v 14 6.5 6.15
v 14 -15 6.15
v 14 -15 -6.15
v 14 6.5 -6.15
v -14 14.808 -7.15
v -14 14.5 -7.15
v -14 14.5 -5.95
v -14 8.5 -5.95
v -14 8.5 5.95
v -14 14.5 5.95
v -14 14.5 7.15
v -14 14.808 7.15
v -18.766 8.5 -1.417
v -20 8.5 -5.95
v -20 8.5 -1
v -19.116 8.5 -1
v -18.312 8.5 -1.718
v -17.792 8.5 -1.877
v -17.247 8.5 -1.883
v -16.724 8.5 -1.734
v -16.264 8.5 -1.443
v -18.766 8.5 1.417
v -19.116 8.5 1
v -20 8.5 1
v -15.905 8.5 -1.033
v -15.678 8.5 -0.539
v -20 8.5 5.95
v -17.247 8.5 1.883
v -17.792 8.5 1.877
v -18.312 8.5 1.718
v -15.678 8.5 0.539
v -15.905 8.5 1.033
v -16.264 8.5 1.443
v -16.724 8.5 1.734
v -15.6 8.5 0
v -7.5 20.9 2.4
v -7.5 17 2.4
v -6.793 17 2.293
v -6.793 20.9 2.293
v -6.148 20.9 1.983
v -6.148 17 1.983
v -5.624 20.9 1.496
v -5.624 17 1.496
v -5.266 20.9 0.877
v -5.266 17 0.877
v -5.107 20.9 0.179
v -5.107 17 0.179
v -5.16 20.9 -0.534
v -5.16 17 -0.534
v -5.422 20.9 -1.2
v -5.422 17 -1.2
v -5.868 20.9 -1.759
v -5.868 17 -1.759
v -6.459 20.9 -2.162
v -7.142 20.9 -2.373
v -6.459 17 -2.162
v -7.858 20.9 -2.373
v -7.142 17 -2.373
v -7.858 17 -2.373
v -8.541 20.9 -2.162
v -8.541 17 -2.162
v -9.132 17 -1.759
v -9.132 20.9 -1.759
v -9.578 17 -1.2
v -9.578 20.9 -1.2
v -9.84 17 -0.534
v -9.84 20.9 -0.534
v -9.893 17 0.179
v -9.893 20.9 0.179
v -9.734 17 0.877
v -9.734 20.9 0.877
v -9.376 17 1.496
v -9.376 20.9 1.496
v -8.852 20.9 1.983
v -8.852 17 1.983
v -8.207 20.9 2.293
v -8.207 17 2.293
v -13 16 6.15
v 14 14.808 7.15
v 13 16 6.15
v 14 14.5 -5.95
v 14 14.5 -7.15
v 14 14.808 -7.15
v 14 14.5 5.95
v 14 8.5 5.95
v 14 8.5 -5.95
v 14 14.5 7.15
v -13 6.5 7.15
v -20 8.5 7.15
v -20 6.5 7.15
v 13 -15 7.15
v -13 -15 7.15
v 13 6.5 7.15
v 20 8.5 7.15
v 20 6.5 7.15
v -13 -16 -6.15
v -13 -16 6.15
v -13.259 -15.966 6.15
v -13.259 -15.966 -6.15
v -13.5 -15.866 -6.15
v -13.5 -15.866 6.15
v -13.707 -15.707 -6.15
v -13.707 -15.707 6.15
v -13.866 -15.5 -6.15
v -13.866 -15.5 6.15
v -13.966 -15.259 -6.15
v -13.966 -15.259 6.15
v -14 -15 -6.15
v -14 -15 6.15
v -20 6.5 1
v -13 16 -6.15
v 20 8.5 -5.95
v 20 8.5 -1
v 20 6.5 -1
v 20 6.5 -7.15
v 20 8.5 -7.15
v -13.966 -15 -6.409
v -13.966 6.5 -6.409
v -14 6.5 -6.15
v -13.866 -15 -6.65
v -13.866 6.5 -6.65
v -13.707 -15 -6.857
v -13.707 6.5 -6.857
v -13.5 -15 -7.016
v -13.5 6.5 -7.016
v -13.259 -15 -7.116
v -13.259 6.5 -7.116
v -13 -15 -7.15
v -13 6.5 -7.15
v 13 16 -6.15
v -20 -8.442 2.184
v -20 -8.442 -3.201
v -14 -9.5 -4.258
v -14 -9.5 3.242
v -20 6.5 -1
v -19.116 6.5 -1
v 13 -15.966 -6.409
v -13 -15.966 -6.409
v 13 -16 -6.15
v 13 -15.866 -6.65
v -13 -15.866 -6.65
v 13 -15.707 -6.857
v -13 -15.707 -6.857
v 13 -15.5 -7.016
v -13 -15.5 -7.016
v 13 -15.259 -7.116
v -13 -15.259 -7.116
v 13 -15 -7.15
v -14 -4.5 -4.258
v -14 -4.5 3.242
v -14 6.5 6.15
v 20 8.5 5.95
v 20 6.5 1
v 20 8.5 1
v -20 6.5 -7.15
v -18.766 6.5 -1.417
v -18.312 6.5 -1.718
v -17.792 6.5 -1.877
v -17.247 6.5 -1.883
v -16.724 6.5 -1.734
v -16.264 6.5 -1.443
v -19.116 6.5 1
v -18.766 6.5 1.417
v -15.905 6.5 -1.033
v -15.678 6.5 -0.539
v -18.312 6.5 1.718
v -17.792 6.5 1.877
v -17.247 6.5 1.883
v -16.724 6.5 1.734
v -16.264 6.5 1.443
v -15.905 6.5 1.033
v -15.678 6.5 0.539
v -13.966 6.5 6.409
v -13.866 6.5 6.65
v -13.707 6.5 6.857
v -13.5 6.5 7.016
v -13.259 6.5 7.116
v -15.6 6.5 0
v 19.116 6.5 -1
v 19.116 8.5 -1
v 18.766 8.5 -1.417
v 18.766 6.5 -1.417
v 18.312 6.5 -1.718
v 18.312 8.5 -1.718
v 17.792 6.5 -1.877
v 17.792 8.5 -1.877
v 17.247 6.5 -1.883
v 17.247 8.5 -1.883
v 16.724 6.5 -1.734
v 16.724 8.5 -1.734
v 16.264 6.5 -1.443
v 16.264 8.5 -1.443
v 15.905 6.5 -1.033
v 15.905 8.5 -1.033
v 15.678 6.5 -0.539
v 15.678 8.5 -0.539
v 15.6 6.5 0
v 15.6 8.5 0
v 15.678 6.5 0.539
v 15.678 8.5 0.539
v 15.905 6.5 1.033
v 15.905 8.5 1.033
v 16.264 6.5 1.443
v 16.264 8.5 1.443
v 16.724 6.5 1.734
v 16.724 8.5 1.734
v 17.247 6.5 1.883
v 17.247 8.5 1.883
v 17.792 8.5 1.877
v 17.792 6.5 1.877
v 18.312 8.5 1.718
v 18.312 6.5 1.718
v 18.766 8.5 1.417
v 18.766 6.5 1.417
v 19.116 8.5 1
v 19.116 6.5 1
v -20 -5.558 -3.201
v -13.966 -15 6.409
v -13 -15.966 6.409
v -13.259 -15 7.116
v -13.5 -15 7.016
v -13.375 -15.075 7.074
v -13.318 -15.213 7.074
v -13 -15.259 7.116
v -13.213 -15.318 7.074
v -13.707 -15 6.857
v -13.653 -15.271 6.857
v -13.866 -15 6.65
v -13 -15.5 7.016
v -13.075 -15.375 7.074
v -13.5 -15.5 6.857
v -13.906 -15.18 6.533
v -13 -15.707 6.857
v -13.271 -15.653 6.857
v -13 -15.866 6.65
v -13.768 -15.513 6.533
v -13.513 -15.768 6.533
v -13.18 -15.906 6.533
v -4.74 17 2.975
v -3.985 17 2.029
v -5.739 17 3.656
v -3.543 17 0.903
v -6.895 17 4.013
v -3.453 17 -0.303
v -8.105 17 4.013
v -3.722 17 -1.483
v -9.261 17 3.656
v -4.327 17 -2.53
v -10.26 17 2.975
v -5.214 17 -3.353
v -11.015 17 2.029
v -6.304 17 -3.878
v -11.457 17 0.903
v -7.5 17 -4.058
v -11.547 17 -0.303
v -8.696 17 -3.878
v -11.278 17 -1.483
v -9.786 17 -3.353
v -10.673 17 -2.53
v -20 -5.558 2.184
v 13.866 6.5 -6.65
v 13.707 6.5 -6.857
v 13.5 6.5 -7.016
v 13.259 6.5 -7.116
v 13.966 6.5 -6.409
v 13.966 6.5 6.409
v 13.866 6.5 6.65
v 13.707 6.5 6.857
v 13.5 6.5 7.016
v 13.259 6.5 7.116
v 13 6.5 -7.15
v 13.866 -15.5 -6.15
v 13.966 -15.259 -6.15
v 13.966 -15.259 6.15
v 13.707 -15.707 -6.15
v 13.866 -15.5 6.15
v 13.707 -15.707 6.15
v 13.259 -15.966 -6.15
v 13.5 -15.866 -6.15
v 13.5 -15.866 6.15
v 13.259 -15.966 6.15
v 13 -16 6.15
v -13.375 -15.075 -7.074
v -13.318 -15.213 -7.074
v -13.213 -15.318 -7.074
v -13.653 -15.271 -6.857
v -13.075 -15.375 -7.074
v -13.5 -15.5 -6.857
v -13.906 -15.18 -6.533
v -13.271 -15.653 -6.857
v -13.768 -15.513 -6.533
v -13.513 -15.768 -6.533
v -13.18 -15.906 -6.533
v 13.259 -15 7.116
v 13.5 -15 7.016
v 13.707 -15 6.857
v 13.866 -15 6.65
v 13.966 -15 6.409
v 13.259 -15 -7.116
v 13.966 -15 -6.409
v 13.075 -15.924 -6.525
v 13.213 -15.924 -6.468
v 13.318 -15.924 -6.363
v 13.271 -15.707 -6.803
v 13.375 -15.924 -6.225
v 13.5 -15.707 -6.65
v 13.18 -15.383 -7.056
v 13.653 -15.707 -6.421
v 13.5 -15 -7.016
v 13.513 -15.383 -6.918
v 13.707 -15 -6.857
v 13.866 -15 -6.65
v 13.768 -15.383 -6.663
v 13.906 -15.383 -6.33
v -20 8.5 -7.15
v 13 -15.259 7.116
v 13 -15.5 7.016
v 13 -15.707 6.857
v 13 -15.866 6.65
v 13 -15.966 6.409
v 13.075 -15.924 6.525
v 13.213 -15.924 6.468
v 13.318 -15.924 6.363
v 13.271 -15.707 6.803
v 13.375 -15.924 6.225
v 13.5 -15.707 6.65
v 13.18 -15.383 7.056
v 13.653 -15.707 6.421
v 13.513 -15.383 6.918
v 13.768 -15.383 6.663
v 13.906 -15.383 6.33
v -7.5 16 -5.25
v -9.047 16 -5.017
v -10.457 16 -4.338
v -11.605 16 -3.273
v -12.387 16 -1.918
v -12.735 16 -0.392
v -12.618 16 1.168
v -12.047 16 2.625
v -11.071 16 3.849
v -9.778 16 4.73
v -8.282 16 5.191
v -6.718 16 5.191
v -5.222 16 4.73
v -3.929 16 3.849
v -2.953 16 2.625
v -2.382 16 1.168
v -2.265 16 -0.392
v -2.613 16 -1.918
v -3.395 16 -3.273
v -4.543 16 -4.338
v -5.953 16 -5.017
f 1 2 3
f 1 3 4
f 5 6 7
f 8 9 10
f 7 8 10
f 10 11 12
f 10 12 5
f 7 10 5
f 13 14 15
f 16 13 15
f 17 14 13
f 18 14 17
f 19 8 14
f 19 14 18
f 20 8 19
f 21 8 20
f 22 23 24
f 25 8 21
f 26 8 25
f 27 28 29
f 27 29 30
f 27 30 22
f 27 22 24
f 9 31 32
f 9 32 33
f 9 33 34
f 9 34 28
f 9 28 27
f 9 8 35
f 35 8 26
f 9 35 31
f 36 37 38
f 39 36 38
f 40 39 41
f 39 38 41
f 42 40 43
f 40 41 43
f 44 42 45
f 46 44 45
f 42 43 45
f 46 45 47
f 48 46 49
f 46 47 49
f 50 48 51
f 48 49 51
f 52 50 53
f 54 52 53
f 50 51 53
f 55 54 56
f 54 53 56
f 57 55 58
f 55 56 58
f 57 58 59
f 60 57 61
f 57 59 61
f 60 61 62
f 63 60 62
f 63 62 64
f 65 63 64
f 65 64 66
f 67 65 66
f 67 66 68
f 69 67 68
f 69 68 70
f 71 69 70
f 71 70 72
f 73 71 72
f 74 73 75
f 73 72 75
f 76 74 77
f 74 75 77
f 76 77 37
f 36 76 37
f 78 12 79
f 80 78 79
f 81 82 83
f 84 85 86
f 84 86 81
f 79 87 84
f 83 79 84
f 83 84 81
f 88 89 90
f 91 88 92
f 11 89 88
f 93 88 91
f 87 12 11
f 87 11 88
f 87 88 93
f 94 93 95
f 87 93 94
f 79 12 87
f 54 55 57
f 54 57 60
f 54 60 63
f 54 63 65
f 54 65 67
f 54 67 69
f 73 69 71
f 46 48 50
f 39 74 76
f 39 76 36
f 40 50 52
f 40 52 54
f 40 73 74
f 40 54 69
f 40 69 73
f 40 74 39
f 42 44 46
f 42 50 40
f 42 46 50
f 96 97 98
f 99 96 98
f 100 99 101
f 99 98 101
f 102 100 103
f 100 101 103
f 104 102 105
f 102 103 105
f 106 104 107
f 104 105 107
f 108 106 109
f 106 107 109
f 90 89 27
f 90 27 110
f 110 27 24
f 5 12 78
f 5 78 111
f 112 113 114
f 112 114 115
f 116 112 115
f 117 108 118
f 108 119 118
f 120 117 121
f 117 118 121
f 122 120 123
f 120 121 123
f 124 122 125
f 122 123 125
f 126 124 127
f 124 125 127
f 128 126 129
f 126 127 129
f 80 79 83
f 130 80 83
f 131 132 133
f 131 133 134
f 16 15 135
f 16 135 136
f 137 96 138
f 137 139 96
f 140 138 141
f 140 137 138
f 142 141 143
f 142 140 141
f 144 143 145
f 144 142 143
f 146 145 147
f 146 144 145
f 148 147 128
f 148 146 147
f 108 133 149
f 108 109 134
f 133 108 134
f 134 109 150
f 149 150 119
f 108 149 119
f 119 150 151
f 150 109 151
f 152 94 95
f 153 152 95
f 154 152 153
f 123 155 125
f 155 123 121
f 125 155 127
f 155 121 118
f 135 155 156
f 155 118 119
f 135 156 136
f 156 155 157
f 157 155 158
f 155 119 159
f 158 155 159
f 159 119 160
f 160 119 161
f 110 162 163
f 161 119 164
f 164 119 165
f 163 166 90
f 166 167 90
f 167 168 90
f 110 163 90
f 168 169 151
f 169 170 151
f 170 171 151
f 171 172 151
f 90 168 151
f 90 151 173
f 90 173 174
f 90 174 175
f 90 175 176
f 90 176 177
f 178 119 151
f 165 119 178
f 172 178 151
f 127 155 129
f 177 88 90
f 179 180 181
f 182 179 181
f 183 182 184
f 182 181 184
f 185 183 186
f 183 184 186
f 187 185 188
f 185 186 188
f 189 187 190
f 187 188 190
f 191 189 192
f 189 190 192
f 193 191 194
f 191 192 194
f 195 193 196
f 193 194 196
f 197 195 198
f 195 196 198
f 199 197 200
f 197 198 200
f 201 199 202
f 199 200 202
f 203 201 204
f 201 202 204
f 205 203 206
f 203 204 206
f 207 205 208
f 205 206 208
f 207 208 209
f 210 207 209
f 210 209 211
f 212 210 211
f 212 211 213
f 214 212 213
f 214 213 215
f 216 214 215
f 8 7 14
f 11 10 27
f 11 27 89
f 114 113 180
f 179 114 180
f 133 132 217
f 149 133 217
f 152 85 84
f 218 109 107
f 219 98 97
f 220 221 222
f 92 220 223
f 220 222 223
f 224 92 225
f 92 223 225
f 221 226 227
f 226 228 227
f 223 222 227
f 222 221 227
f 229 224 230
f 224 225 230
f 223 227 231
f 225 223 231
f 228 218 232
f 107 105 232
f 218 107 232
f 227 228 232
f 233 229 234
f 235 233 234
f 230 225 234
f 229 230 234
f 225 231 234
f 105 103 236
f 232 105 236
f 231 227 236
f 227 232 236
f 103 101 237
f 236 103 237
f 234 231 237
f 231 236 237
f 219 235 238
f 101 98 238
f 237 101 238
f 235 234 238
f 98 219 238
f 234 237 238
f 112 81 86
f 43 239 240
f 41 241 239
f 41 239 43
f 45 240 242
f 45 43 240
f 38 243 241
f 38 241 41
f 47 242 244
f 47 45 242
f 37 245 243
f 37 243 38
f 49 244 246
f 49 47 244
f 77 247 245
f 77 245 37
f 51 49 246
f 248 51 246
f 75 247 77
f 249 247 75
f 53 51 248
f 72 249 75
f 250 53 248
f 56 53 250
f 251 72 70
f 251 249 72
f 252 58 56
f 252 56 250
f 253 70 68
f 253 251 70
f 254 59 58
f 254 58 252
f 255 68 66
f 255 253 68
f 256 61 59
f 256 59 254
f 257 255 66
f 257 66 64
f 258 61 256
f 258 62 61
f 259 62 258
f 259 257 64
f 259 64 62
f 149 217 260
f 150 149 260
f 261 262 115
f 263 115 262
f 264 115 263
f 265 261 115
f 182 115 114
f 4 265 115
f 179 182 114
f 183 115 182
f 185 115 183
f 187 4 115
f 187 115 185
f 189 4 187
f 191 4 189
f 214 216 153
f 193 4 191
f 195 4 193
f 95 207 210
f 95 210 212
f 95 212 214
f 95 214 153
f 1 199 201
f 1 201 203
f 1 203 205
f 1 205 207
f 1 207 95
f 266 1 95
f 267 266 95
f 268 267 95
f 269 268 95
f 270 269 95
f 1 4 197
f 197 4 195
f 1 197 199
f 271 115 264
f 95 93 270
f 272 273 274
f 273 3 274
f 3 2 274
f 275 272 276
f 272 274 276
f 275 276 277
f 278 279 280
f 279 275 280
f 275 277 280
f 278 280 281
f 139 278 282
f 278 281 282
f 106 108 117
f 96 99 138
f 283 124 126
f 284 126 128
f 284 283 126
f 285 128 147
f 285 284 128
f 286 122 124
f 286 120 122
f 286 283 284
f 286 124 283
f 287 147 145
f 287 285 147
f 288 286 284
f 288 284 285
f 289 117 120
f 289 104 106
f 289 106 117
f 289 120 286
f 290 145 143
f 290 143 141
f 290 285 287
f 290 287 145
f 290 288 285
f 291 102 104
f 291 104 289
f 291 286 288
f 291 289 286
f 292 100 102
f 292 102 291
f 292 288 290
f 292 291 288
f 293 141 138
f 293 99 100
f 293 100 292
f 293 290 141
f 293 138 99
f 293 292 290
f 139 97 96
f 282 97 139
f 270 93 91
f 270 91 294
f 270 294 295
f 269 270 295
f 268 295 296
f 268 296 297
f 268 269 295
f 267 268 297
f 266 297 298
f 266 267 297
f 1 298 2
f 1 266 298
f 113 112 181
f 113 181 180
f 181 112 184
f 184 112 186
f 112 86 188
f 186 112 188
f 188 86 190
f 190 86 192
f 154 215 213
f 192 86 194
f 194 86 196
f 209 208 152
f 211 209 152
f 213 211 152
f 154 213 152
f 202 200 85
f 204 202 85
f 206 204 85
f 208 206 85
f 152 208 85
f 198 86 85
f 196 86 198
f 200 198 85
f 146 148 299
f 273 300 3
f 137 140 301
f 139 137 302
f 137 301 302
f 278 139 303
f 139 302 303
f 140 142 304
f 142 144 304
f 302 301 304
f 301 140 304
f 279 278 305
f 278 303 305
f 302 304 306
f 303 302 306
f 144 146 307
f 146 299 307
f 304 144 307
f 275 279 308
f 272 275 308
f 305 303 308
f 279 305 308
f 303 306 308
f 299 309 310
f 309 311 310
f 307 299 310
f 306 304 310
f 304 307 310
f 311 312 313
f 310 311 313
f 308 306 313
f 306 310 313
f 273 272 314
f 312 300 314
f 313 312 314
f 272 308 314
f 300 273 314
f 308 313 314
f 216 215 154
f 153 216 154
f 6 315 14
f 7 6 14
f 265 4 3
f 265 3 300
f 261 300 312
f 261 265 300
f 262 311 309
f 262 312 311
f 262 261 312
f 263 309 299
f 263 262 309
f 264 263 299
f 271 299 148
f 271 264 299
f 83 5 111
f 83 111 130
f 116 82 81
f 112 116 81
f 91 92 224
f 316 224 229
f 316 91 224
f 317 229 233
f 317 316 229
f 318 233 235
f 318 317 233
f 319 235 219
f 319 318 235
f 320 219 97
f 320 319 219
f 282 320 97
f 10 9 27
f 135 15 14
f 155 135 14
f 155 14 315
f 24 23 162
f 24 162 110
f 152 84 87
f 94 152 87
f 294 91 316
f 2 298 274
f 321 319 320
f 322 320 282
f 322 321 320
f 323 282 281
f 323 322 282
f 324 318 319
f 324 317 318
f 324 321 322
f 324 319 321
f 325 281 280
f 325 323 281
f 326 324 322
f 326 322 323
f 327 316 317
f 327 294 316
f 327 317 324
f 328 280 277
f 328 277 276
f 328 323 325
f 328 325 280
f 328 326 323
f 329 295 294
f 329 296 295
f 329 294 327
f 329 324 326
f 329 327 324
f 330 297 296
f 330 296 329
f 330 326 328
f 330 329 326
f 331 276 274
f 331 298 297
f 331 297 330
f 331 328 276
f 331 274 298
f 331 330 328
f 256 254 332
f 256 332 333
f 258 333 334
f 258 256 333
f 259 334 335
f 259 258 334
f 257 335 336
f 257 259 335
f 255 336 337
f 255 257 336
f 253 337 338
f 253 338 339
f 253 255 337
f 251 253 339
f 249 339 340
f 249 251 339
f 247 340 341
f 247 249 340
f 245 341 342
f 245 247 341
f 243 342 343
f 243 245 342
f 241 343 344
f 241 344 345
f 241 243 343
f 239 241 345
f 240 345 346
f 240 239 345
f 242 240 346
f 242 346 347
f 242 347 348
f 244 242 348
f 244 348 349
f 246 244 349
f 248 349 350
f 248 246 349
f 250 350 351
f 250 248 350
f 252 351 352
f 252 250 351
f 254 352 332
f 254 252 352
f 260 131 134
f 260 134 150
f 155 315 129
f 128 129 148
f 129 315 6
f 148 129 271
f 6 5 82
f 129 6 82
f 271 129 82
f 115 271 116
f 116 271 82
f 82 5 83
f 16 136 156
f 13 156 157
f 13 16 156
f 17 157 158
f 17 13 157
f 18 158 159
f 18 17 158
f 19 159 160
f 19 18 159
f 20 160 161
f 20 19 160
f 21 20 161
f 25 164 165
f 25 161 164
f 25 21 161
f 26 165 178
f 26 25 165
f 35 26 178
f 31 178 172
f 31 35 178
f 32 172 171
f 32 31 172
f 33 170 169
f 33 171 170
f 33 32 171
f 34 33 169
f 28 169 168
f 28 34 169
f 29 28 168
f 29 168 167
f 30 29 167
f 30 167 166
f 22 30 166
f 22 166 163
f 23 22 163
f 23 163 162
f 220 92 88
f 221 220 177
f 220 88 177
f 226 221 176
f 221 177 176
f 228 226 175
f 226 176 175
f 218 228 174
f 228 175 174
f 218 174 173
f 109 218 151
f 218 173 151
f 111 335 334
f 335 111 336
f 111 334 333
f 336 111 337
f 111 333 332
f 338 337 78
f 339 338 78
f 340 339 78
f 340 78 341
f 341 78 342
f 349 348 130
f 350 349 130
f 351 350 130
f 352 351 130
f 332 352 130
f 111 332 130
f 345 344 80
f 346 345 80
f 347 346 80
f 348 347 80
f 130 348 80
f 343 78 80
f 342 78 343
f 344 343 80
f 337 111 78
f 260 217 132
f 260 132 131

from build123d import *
from OCP.BRepFilletAPI import BRepFilletAPI_MakeChamfer

# Parameters (mm, degrees)
ESQUISSE1_W                  = 28
ESQUISSE1_H                  = 32
BOSS_EXTRU_1_DEPTH           = 7.15
BOSS_EXTRU_2_DEPTH           = 6
CHANFREIN1_SIZE              = 6
ENL_V_MAT_EXTRU_1_DEPTH      = 6
CHANFREIN1_OF_SYM_TRIE1_SIZE = 6
CONG_1_R                     = 1
ESQUISSE4_R                  = 5.25
BOSS_EXTRU_3_DEPTH           = 1
CHANFREIN2_SIZE2             = 1.191753593
CHANFREIN2_SIZE              = 1
ESQUISSE5_R                  = 2.4
BOSS_EXTRU_4_DEPTH           = 3.9
CHANFREIN3_SIZE              = 1
CHANFREIN3_SIZE2             = 1.191753593
ESQUISSE6_W                  = 7.5
ESQUISSE6_H                  = 5
BOSS_EXTRU_5_DEPTH           = 6
CHANFREIN4_SIZE              = 6
CHANFREIN4_SIZE_2            = 1.057961884


with BuildPart() as part:
    # Esquisse1 → Boss.-Extru.1 (new, symmetric)
    with BuildSketch(Plane.XY):
        Rectangle(ESQUISSE1_W, ESQUISSE1_H)
    extrude(amount=BOSS_EXTRU_1_DEPTH, both=True)

    # Esquisse2 → Boss.-Extru.2 (add)
    with BuildSketch(Plane.ZY.offset(14)):
        Polygon((5.95, 14.5), (7.15, 14.5), (7.15, 6.5), (5.366521974, 6.5), (-5.315928015, 6.5), (-7.15, 6.5), (-7.15, 14.5), (-5.95, 14.5), (-5.95, 8.5), (5.95, 8.5), align=None)
    boss_extru_2 = extrude(amount=BOSS_EXTRU_2_DEPTH)

    # Chanfrein1
    chanfrein1_edges = [part.edges().sort_by_distance(p)[0] for p in [
        (-20, 14.5, 6.55),
        (-20, 14.5, -6.55),
    ]]
    chamfer(chanfrein1_edges, length=CHANFREIN1_SIZE - 0.0001)  # a hair under: the kernel refuses the full size

    # Esquisse3 → Enlèv. mat.-Extru.1 (cut)
    with BuildSketch(Plane(origin=(0, 8.5, 0), x_dir=(1, 0, 0), z_dir=(0, 1, 0))):
        with BuildLine():
            Line((-20, 1), (-19.115549442, 1))
            ThreePointArc((-19.115549442, 1), (-15.6, 0), (-19.115549442, -1))
            Line((-19.115549442, -1), (-20, -1))
            Line((-20, -1), (-20, 1))
        make_face()
    enl_v_mat_extru_1 = extrude(amount=-ENL_V_MAT_EXTRU_1_DEPTH, mode=Mode.SUBTRACT)

    # Symétrie1: Boss.-Extru.2, Enlèv. mat.-Extru.1 across plane
    add(boss_extru_2.mirror(Plane(origin=(0, 0, 0), x_dir=(0, 0, 1), z_dir=(1, 0, 0))))
    add(enl_v_mat_extru_1.mirror(Plane(origin=(0, 0, 0), x_dir=(0, 0, 1), z_dir=(1, 0, 0))), mode=Mode.SUBTRACT)

    # Chanfrein1 of Symétrie1
    chanfrein1_of_sym_trie1_edges = [part.edges().sort_by_distance(p)[0] for p in [
        (20, 14.5, 6.55),
        (20, 14.5, -6.55),
    ]]
    chamfer(chanfrein1_of_sym_trie1_edges, length=CHANFREIN1_OF_SYM_TRIE1_SIZE - 0.0001)  # a hair under: the kernel refuses the full size

    # Congé1
    cong_1_edges = [part.edges().sort_by_distance(p)[0] for p in [
        (-14, -16, 0),
        (-14, -4.75, -7.15),
        (-14, -4.75, 7.15),
        (14, -4.75, -7.15),
        (14, -4.75, 7.15),
        (0, -16, -7.15),
        (0, -16, 7.15),
        (14, -16, 0),
    ]]
    fillet(cong_1_edges, radius=CONG_1_R)

    # Esquisse4 → Boss.-Extru.3 (add)
    with BuildSketch(Plane(origin=(0, 16, 0), x_dir=(1, 0, 0), z_dir=(0, 1, 0))):
        with Locations(Location((-7.5, 0, 0), (0, 0, 90))):
            Circle(ESQUISSE4_R)
    extrude(amount=BOSS_EXTRU_3_DEPTH)

    # Chanfrein2
    chanfrein2_edges = [part.edges().sort_by_distance(p)[0] for p in [
        (-7.5, 17, 5.25),
    ]]
    chanfrein2_side = [part.faces().sort_by_distance(p)[0] for p in [
        (-7.5, 16.98, 5.25),
    ]]
    chamfer(chanfrein2_edges, length=CHANFREIN2_SIZE - 0.0001, length2=CHANFREIN2_SIZE2 - 0.0001, reference=chanfrein2_side[0])  # a hair under: the kernel refuses the full size

    # Esquisse5 → Boss.-Extru.4 (add)
    with BuildSketch(Plane(origin=(0, 17, 0), x_dir=(1, 0, 0), z_dir=(0, 1, 0))):
        with Locations(Location((-7.5, 0, 0), (0, 0, 270))):
            Circle(ESQUISSE5_R)
    extrude(amount=BOSS_EXTRU_4_DEPTH)

    # Chanfrein3
    chanfrein3_edges = [part.edges().sort_by_distance(p)[0] for p in [
        (14, 16, 0),
        (0, 16, -7.15),
        (0, 16, 7.15),
        (-14, 16, 0),
    ]]
    chanfrein3_side = [part.faces().sort_by_distance(p)[0] for p in [
        (2.069489218, 16, 0),
    ]]
    chamfer(chanfrein3_edges, length=CHANFREIN3_SIZE, length2=CHANFREIN3_SIZE2, reference=chanfrein3_side[0])

    # Esquisse6 → Boss.-Extru.5 (add)
    with BuildSketch(Plane.ZY.offset(14)):
        with Locations((-0.508404359, -7)):
            Rectangle(ESQUISSE6_W, ESQUISSE6_H)
    extrude(amount=BOSS_EXTRU_5_DEPTH)

    # Chanfrein4
    chanfrein4_edges_1 = [part.edges().sort_by_distance(p)[0] for p in [
        (-20, -7, -4.258404359),
    ]]
    chanfrein4_side_1 = [part.faces().sort_by_distance(p)[0] for p in [
        (-19.978840762, -7, -4.258404359),
    ]]
    chanfrein4_edges_2 = [part.edges().sort_by_distance(p)[0] for p in [
        (-20, -9.5, -0.508404359),
    ]]
    chanfrein4_side_2 = [part.faces().sort_by_distance(p)[0] for p in [
        (-19.978840762, -9.5, -0.508404359),
    ]]
    chanfrein4_edges_3 = [part.edges().sort_by_distance(p)[0] for p in [
        (-20, -7, 3.241595641),
    ]]
    chanfrein4_side_3 = [part.faces().sort_by_distance(p)[0] for p in [
        (-19.978840762, -7, 3.241595641),
    ]]
    chanfrein4_edges_4 = [part.edges().sort_by_distance(p)[0] for p in [
        (-20, -4.5, -0.508404359),
    ]]
    chanfrein4_side_4 = [part.faces().sort_by_distance(p)[0] for p in [
        (-19.978840762, -4.5, -0.508404359),
    ]]
    chanfrein4 = BRepFilletAPI_MakeChamfer(part.part.solid().wrapped)
    for e in chanfrein4_edges_1:
        chanfrein4.Add(CHANFREIN4_SIZE - 0.0001, CHANFREIN4_SIZE_2 - 0.0001, e.wrapped, chanfrein4_side_1[0].wrapped)
    for e in chanfrein4_edges_2:
        chanfrein4.Add(CHANFREIN4_SIZE - 0.0001, CHANFREIN4_SIZE_2 - 0.0001, e.wrapped, chanfrein4_side_2[0].wrapped)
    for e in chanfrein4_edges_3:
        chanfrein4.Add(CHANFREIN4_SIZE - 0.0001, CHANFREIN4_SIZE_2 - 0.0001, e.wrapped, chanfrein4_side_3[0].wrapped)
    for e in chanfrein4_edges_4:
        chanfrein4.Add(CHANFREIN4_SIZE - 0.0001, CHANFREIN4_SIZE_2 - 0.0001, e.wrapped, chanfrein4_side_4[0].wrapped)
    add(Compound.cast(chanfrein4.Shape()), mode=Mode.REPLACE)  # a hair under: the kernel refuses the full size


solid = part.part
